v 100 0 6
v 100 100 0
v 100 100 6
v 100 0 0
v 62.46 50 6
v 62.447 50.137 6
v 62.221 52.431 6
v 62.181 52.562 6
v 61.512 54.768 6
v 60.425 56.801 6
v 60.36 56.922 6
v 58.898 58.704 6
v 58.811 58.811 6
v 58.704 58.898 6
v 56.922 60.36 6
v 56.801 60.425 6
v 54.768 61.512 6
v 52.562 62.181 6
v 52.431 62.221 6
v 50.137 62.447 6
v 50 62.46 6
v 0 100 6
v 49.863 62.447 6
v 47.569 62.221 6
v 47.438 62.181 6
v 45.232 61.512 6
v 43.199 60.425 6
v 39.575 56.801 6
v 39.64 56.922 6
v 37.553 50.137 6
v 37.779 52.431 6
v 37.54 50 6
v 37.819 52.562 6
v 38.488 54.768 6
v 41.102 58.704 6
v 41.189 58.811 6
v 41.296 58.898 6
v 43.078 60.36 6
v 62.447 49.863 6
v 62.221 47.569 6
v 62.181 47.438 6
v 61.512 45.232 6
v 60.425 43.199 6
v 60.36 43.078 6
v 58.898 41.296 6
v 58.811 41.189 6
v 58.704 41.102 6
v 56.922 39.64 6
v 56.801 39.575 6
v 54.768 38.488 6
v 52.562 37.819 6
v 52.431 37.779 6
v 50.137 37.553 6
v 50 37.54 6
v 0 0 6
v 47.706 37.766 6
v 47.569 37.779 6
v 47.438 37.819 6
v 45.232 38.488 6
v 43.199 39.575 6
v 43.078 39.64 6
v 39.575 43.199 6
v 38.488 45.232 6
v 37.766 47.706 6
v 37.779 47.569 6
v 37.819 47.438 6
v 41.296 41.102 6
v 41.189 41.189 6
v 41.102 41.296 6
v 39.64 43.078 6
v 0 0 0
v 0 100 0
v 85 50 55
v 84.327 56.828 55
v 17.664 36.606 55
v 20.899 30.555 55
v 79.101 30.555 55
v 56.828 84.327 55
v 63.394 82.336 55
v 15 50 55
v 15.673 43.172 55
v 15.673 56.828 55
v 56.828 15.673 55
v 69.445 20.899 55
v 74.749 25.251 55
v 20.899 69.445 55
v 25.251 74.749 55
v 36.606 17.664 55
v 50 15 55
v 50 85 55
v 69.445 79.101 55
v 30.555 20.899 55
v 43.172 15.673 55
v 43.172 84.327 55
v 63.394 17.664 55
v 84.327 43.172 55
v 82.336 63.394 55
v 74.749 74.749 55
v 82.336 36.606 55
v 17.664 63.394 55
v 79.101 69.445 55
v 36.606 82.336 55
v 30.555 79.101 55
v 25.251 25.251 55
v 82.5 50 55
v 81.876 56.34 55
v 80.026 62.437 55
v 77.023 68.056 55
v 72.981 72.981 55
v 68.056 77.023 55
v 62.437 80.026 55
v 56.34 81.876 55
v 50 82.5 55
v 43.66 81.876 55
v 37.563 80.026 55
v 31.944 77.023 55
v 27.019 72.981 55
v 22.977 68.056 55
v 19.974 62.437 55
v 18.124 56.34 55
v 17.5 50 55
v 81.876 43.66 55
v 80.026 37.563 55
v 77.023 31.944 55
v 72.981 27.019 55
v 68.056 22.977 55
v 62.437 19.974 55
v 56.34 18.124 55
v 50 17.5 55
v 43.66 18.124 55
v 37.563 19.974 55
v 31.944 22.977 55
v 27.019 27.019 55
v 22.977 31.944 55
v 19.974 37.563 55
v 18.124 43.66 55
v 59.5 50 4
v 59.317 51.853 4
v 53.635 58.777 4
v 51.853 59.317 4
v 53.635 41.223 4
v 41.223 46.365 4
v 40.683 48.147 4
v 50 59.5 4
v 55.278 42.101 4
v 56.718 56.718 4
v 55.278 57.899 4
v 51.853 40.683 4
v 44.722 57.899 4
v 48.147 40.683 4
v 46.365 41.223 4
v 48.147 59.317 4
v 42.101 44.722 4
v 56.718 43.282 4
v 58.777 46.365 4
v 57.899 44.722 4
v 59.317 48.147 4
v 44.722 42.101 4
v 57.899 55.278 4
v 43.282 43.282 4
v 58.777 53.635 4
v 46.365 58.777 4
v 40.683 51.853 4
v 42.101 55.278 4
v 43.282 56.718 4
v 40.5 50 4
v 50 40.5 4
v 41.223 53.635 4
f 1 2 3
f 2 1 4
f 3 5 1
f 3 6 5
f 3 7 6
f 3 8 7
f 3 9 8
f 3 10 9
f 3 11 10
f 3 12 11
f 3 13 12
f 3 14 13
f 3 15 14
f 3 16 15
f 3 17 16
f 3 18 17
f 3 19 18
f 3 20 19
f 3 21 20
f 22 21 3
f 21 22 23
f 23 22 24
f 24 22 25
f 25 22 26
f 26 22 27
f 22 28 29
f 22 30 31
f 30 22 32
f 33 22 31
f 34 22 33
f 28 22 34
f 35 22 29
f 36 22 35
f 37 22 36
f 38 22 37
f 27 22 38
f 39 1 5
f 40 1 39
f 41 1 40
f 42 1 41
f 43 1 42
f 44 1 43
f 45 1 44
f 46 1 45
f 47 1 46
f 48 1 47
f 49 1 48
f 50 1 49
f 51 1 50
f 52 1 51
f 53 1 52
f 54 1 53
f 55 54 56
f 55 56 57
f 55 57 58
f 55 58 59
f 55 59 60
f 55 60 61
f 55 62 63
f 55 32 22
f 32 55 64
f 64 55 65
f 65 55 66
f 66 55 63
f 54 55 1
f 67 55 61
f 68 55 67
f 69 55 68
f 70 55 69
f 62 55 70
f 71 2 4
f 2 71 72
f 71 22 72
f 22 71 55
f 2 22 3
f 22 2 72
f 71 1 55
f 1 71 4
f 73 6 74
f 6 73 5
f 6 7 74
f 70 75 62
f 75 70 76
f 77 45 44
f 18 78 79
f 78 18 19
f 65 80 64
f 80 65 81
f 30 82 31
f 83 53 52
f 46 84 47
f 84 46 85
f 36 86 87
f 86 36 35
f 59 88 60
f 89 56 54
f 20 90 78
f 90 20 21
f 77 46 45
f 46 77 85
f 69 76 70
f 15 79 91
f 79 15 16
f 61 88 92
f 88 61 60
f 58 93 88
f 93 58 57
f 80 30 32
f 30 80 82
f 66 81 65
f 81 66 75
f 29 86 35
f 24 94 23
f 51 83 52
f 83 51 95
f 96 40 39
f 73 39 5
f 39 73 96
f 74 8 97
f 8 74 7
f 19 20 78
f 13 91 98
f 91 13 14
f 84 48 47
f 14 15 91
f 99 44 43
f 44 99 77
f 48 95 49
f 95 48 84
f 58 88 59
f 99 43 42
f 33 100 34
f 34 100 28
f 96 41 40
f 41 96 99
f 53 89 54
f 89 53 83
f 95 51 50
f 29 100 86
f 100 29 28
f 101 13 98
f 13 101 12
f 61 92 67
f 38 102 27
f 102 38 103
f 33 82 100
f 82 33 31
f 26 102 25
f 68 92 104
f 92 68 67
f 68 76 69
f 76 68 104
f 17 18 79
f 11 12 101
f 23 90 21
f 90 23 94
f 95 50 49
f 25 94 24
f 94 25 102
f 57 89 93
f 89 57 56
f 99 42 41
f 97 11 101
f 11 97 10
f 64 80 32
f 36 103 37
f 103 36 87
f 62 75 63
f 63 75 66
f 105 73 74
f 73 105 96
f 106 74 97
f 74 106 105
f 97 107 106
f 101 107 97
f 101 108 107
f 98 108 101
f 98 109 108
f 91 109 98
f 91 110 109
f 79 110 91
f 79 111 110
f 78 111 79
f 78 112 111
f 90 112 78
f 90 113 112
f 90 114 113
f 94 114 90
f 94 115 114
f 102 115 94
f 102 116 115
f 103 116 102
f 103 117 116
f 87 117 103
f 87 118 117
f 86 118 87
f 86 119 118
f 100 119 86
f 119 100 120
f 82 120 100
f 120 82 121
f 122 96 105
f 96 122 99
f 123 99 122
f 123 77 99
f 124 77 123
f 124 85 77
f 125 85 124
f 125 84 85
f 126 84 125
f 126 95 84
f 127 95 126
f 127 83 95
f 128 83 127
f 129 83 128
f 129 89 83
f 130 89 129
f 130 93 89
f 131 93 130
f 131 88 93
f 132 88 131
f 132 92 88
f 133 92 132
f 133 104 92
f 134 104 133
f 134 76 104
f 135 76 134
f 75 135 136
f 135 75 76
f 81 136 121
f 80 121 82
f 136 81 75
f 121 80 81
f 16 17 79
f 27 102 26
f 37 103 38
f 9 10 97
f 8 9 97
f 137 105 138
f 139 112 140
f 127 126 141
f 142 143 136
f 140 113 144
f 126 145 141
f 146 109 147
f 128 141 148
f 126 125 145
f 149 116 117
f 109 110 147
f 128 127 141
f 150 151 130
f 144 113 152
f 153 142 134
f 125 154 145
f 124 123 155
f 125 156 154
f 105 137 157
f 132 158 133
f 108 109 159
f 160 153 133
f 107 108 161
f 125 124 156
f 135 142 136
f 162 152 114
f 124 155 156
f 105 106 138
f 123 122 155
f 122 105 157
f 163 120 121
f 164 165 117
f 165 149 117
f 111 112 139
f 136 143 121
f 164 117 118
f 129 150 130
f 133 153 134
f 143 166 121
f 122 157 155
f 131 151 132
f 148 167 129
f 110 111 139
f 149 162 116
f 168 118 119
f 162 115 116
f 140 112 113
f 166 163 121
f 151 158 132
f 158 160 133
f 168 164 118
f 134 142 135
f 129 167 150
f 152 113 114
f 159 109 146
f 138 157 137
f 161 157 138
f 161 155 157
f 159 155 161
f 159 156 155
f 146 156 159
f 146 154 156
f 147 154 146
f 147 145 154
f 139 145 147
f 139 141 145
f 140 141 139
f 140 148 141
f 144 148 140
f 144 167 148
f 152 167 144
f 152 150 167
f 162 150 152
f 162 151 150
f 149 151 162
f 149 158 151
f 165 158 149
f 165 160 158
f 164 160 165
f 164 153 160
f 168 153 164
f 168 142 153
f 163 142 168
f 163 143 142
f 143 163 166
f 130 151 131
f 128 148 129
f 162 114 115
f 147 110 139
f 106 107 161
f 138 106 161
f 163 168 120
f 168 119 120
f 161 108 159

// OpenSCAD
$fn = 32;

// ----------------------------------------------------------------------
// Hopper: funnel with square flange
// ----------------------------------------------------------------------

// --- parameters (mm) ---
fl = 100;                 // flange side, X and Y
fl_t = 6;                 // flange thickness
cone_h = 50;              // cone height above the flange
top_d = 70;               // cone mouth diameter
bot_d = 24;               // cone spout diameter
wall = 2.5;               // cone wall thickness

bore_d = bot_d - 2 * wall;  // spout bore diameter
total_h = fl_t + cone_h - 1;  // overall height

difference() {
  union() {
    cube([fl, fl, fl_t]);
    translate([fl / 2, fl / 2, fl_t - 1])
      cylinder(h = cone_h, d1 = bot_d, d2 = top_d);
  }
  translate([fl / 2, fl / 2, fl_t - 2])
    cylinder(h = cone_h + 1, d1 = bore_d, d2 = top_d - 2 * wall);
}
